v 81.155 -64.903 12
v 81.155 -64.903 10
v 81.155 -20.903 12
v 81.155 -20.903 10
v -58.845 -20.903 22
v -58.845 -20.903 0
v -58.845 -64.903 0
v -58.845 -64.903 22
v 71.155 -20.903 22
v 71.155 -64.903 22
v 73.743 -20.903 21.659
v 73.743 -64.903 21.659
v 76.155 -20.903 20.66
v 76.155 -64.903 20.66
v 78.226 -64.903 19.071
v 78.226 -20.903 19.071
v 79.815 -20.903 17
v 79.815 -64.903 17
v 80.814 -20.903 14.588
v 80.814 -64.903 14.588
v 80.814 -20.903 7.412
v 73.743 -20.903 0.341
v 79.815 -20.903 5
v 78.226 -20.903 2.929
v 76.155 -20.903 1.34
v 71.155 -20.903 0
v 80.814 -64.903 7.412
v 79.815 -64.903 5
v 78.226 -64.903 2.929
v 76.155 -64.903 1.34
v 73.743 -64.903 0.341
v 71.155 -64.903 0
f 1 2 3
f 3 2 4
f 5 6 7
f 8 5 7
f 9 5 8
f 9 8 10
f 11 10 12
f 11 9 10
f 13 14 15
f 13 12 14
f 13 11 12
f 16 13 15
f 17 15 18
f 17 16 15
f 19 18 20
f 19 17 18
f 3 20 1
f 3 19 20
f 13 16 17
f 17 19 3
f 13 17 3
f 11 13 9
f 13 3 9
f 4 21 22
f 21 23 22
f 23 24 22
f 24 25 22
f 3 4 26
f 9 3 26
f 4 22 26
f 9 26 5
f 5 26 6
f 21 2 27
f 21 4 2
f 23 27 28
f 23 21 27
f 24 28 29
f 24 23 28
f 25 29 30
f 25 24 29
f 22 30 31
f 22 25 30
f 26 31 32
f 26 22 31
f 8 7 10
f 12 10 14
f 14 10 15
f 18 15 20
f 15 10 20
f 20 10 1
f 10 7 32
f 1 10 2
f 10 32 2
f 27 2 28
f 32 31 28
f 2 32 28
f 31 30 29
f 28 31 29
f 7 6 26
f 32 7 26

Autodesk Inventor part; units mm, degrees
ref_plane "YZ Plane" through (0, 0, 0) normal (1, 0, 0) x (0, 1, 0)
ref_plane "XZ Plane" through (0, 0, 0) normal (0, 1, 0) x (-1, 0, 0)
ref_plane "XY Plane" through (0, 0, 0) normal (0, 0, 1) x (1, 0, 0)
sketch "Эскиз1" plane through (0, 0, 0) normal (0, 0, 1) x (1, 0, 0)
  line L0 (74.0863, 5.032) -> (74.0863, 52.032) projected
  line L1 (81.155, -20.903) -> (-58.845, -20.903)
  line L2 (-58.845, -20.903) -> (-58.845, -64.903)
  line L3 (-58.845, -64.903) -> (81.155, -64.903)
  line L4 (81.155, -64.903) -> (81.155, -20.903)
  point P0 (0, 0)
  dimension "d0" = 44
  dimension "d1" = 140
extrude "Выдавливание1" add sketch "Эскиз1" along normal blind 22
fillet "Сопряжение1" radius 10 2 edges at (81.155, -42.903, 22) (81.155, -42.903, 0)
properties part number "akum12v"
